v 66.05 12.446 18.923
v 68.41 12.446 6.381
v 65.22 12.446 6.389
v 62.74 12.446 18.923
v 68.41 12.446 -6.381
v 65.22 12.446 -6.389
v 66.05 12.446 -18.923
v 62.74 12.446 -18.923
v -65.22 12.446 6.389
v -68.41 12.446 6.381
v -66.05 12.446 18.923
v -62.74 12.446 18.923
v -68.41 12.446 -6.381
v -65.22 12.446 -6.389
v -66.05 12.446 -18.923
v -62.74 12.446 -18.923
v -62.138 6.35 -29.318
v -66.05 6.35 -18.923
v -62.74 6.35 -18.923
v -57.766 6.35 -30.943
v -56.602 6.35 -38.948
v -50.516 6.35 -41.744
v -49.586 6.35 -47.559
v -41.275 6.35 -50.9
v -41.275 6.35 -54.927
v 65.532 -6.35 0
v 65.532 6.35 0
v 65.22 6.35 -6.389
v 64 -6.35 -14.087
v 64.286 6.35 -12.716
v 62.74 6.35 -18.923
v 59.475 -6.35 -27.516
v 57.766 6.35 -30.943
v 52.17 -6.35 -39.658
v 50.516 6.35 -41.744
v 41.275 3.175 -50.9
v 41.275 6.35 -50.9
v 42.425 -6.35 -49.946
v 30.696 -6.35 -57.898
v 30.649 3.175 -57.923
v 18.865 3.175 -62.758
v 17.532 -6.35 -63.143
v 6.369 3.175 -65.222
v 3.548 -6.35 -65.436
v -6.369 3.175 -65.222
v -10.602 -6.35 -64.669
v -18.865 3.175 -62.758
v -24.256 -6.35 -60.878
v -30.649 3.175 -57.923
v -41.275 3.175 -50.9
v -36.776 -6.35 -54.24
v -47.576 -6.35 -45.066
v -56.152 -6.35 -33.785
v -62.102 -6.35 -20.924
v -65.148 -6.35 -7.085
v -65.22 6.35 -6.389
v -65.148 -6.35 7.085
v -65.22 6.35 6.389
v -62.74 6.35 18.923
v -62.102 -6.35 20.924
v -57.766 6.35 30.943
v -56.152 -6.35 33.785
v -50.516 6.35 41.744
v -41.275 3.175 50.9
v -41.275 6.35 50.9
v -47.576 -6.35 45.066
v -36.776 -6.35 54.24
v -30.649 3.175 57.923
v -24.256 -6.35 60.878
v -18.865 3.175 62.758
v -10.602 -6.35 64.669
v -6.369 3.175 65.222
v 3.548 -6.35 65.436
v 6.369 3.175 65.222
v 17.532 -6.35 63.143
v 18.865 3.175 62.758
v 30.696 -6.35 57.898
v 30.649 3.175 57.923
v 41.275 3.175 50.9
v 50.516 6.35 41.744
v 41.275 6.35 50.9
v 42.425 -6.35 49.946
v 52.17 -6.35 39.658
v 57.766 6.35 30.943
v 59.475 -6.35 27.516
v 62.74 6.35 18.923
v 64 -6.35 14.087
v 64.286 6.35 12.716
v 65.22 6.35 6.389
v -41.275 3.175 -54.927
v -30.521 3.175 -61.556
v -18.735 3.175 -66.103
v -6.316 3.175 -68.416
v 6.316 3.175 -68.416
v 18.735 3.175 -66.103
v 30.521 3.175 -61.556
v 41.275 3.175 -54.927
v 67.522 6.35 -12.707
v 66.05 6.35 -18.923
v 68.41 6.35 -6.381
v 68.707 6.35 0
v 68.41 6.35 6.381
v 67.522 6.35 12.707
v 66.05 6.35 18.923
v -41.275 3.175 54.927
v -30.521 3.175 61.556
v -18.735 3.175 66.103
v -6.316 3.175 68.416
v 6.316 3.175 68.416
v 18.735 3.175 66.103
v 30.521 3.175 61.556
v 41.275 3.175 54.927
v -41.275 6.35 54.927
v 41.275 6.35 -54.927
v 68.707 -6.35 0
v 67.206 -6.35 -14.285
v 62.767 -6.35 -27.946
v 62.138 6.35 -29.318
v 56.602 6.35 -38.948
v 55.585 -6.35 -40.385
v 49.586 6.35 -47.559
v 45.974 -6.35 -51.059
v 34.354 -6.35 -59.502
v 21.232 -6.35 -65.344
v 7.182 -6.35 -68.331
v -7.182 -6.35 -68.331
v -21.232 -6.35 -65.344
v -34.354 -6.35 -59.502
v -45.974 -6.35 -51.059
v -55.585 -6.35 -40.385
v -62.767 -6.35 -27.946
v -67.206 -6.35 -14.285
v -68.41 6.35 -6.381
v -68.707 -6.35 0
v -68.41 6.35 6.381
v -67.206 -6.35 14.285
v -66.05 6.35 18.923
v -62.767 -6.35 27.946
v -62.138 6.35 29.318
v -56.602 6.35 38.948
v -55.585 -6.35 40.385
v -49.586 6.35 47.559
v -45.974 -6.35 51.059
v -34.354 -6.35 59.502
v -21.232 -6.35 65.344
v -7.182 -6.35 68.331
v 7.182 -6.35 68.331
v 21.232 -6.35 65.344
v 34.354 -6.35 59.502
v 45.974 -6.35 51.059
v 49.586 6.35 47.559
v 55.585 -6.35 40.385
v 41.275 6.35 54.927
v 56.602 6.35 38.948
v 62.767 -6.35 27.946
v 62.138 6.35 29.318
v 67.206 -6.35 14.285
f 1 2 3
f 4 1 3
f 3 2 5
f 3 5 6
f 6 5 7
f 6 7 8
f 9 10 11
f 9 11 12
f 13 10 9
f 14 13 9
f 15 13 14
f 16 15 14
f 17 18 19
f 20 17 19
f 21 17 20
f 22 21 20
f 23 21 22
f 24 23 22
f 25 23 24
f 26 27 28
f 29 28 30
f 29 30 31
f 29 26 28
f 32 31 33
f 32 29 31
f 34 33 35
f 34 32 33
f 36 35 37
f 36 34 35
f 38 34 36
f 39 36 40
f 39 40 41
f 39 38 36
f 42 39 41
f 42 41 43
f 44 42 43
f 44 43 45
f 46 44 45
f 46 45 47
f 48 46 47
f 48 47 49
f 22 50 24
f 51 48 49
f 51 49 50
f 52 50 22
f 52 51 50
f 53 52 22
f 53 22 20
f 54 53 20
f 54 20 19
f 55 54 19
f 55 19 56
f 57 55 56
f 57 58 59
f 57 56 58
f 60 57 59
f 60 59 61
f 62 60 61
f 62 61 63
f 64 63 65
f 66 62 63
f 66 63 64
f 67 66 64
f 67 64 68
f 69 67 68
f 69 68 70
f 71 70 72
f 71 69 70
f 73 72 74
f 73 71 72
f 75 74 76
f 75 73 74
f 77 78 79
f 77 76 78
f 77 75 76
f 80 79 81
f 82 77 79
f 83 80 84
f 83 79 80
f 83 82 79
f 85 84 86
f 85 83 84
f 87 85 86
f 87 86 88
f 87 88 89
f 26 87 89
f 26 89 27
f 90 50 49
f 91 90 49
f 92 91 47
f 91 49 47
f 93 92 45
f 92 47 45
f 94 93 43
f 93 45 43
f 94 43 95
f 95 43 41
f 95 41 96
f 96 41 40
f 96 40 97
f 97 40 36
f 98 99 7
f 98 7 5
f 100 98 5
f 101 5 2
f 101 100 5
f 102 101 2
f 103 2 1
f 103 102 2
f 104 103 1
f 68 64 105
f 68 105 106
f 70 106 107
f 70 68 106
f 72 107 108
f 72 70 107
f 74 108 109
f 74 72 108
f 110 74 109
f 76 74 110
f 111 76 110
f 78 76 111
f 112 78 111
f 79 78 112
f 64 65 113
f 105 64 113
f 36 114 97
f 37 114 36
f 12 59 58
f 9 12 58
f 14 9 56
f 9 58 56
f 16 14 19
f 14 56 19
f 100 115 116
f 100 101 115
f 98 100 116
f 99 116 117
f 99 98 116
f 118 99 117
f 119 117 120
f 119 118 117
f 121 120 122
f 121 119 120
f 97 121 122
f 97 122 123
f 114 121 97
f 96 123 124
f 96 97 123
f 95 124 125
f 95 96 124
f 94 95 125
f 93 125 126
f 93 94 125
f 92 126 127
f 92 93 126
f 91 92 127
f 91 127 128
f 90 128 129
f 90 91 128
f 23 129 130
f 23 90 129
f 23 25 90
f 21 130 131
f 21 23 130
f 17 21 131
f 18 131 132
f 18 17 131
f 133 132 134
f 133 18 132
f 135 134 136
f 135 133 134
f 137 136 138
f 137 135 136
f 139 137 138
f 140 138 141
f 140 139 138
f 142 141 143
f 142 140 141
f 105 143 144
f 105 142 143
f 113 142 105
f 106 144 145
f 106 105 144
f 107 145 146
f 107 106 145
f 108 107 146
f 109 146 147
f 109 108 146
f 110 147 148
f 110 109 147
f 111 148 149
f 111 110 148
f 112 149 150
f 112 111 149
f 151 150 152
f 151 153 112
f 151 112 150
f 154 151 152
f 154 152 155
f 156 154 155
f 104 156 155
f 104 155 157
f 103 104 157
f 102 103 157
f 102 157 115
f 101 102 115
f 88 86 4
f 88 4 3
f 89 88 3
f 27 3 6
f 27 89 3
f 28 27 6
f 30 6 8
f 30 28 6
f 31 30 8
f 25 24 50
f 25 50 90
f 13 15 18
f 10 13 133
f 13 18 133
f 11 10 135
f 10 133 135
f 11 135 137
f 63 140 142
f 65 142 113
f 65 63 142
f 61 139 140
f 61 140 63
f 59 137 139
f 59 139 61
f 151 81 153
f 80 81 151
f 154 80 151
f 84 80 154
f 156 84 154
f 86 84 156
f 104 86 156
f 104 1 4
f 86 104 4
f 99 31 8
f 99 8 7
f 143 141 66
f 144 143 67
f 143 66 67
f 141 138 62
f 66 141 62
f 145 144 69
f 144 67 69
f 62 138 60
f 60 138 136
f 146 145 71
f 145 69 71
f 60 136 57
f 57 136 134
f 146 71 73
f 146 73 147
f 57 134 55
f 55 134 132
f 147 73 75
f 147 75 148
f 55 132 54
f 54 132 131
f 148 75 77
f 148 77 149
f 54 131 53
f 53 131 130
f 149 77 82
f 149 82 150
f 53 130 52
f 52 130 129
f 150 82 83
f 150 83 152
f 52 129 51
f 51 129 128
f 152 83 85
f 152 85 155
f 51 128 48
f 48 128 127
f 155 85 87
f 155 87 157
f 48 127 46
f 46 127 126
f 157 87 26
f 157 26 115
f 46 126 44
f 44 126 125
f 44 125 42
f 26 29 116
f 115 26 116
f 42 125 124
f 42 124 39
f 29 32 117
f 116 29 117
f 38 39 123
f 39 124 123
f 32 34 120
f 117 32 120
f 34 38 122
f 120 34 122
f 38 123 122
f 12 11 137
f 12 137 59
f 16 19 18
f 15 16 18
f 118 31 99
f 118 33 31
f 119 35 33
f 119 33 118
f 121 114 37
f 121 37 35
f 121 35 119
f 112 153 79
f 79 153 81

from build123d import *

# Parameters (mm, degrees)
SKETCH1_R           = 68.707
SKETCH1_R_2         = 65.532
BOSS_EXTRUDE1_DEPTH = 6.35
CUT_EXTRUDE1_DEPTH  = 3.175
BOSS_EXTRUDE2_DEPTH = 6.096


with BuildPart() as part:
    # Sketch1 → Boss-Extrude1 (new body, symmetric)
    with BuildSketch(Plane(origin=(0, 0, 0), x_dir=(1, 0, 0), z_dir=(0, 1, 0))):
        Circle(SKETCH1_R)
        Circle(SKETCH1_R_2, mode=Mode.SUBTRACT)
    extrude(amount=BOSS_EXTRUDE1_DEPTH, both=True)

    # Sketch2 → Cut-Extrude1 (cut)
    with BuildSketch(Plane(origin=(0, 6.35, 0), x_dir=(1, 0, 0), z_dir=(0, 1, 0))):
        with BuildLine():
            Line((-41.275, -50.900073), (-41.275, -54.927463))
            ThreePointArc((-41.275, -54.927463), (0, -68.707), (41.275, -54.927463))
            Line((41.275, -54.927463), (41.275, -50.900073))
            ThreePointArc((41.275, -50.900073), (0, -65.532), (-41.275, -50.900073))
        make_face()
    cut_extrude1 = extrude(amount=-CUT_EXTRUDE1_DEPTH, mode=Mode.SUBTRACT)

    # Mirror1: Cut-Extrude1 across plane
    add(cut_extrude1.mirror(Plane.XY), mode=Mode.SUBTRACT)

    # Sketch4 → Boss-Extrude2 (add)
    with BuildSketch(Plane(origin=(0, 6.35, 0), x_dir=(1, 0, 0), z_dir=(0, 1, 0))):
        with BuildLine():
            Line((-62.740442, 18.923), (-66.049769, 18.923))
            ThreePointArc((-66.049769, 18.923), (-68.707, 0), (-66.049769, -18.923))
            Line((-66.049769, -18.923), (-62.740442, -18.923))
            ThreePointArc((-62.740442, -18.923), (-65.532, 0), (-62.740442, 18.923))
        make_face()
    boss_extrude2 = extrude(amount=BOSS_EXTRUDE2_DEPTH)

    # Mirror3: Boss-Extrude2 across plane
    add(boss_extrude2.mirror(Plane(origin=(0, 0, 0), x_dir=(0, 0, 1), z_dir=(1, 0, 0))))


solid = part.part
